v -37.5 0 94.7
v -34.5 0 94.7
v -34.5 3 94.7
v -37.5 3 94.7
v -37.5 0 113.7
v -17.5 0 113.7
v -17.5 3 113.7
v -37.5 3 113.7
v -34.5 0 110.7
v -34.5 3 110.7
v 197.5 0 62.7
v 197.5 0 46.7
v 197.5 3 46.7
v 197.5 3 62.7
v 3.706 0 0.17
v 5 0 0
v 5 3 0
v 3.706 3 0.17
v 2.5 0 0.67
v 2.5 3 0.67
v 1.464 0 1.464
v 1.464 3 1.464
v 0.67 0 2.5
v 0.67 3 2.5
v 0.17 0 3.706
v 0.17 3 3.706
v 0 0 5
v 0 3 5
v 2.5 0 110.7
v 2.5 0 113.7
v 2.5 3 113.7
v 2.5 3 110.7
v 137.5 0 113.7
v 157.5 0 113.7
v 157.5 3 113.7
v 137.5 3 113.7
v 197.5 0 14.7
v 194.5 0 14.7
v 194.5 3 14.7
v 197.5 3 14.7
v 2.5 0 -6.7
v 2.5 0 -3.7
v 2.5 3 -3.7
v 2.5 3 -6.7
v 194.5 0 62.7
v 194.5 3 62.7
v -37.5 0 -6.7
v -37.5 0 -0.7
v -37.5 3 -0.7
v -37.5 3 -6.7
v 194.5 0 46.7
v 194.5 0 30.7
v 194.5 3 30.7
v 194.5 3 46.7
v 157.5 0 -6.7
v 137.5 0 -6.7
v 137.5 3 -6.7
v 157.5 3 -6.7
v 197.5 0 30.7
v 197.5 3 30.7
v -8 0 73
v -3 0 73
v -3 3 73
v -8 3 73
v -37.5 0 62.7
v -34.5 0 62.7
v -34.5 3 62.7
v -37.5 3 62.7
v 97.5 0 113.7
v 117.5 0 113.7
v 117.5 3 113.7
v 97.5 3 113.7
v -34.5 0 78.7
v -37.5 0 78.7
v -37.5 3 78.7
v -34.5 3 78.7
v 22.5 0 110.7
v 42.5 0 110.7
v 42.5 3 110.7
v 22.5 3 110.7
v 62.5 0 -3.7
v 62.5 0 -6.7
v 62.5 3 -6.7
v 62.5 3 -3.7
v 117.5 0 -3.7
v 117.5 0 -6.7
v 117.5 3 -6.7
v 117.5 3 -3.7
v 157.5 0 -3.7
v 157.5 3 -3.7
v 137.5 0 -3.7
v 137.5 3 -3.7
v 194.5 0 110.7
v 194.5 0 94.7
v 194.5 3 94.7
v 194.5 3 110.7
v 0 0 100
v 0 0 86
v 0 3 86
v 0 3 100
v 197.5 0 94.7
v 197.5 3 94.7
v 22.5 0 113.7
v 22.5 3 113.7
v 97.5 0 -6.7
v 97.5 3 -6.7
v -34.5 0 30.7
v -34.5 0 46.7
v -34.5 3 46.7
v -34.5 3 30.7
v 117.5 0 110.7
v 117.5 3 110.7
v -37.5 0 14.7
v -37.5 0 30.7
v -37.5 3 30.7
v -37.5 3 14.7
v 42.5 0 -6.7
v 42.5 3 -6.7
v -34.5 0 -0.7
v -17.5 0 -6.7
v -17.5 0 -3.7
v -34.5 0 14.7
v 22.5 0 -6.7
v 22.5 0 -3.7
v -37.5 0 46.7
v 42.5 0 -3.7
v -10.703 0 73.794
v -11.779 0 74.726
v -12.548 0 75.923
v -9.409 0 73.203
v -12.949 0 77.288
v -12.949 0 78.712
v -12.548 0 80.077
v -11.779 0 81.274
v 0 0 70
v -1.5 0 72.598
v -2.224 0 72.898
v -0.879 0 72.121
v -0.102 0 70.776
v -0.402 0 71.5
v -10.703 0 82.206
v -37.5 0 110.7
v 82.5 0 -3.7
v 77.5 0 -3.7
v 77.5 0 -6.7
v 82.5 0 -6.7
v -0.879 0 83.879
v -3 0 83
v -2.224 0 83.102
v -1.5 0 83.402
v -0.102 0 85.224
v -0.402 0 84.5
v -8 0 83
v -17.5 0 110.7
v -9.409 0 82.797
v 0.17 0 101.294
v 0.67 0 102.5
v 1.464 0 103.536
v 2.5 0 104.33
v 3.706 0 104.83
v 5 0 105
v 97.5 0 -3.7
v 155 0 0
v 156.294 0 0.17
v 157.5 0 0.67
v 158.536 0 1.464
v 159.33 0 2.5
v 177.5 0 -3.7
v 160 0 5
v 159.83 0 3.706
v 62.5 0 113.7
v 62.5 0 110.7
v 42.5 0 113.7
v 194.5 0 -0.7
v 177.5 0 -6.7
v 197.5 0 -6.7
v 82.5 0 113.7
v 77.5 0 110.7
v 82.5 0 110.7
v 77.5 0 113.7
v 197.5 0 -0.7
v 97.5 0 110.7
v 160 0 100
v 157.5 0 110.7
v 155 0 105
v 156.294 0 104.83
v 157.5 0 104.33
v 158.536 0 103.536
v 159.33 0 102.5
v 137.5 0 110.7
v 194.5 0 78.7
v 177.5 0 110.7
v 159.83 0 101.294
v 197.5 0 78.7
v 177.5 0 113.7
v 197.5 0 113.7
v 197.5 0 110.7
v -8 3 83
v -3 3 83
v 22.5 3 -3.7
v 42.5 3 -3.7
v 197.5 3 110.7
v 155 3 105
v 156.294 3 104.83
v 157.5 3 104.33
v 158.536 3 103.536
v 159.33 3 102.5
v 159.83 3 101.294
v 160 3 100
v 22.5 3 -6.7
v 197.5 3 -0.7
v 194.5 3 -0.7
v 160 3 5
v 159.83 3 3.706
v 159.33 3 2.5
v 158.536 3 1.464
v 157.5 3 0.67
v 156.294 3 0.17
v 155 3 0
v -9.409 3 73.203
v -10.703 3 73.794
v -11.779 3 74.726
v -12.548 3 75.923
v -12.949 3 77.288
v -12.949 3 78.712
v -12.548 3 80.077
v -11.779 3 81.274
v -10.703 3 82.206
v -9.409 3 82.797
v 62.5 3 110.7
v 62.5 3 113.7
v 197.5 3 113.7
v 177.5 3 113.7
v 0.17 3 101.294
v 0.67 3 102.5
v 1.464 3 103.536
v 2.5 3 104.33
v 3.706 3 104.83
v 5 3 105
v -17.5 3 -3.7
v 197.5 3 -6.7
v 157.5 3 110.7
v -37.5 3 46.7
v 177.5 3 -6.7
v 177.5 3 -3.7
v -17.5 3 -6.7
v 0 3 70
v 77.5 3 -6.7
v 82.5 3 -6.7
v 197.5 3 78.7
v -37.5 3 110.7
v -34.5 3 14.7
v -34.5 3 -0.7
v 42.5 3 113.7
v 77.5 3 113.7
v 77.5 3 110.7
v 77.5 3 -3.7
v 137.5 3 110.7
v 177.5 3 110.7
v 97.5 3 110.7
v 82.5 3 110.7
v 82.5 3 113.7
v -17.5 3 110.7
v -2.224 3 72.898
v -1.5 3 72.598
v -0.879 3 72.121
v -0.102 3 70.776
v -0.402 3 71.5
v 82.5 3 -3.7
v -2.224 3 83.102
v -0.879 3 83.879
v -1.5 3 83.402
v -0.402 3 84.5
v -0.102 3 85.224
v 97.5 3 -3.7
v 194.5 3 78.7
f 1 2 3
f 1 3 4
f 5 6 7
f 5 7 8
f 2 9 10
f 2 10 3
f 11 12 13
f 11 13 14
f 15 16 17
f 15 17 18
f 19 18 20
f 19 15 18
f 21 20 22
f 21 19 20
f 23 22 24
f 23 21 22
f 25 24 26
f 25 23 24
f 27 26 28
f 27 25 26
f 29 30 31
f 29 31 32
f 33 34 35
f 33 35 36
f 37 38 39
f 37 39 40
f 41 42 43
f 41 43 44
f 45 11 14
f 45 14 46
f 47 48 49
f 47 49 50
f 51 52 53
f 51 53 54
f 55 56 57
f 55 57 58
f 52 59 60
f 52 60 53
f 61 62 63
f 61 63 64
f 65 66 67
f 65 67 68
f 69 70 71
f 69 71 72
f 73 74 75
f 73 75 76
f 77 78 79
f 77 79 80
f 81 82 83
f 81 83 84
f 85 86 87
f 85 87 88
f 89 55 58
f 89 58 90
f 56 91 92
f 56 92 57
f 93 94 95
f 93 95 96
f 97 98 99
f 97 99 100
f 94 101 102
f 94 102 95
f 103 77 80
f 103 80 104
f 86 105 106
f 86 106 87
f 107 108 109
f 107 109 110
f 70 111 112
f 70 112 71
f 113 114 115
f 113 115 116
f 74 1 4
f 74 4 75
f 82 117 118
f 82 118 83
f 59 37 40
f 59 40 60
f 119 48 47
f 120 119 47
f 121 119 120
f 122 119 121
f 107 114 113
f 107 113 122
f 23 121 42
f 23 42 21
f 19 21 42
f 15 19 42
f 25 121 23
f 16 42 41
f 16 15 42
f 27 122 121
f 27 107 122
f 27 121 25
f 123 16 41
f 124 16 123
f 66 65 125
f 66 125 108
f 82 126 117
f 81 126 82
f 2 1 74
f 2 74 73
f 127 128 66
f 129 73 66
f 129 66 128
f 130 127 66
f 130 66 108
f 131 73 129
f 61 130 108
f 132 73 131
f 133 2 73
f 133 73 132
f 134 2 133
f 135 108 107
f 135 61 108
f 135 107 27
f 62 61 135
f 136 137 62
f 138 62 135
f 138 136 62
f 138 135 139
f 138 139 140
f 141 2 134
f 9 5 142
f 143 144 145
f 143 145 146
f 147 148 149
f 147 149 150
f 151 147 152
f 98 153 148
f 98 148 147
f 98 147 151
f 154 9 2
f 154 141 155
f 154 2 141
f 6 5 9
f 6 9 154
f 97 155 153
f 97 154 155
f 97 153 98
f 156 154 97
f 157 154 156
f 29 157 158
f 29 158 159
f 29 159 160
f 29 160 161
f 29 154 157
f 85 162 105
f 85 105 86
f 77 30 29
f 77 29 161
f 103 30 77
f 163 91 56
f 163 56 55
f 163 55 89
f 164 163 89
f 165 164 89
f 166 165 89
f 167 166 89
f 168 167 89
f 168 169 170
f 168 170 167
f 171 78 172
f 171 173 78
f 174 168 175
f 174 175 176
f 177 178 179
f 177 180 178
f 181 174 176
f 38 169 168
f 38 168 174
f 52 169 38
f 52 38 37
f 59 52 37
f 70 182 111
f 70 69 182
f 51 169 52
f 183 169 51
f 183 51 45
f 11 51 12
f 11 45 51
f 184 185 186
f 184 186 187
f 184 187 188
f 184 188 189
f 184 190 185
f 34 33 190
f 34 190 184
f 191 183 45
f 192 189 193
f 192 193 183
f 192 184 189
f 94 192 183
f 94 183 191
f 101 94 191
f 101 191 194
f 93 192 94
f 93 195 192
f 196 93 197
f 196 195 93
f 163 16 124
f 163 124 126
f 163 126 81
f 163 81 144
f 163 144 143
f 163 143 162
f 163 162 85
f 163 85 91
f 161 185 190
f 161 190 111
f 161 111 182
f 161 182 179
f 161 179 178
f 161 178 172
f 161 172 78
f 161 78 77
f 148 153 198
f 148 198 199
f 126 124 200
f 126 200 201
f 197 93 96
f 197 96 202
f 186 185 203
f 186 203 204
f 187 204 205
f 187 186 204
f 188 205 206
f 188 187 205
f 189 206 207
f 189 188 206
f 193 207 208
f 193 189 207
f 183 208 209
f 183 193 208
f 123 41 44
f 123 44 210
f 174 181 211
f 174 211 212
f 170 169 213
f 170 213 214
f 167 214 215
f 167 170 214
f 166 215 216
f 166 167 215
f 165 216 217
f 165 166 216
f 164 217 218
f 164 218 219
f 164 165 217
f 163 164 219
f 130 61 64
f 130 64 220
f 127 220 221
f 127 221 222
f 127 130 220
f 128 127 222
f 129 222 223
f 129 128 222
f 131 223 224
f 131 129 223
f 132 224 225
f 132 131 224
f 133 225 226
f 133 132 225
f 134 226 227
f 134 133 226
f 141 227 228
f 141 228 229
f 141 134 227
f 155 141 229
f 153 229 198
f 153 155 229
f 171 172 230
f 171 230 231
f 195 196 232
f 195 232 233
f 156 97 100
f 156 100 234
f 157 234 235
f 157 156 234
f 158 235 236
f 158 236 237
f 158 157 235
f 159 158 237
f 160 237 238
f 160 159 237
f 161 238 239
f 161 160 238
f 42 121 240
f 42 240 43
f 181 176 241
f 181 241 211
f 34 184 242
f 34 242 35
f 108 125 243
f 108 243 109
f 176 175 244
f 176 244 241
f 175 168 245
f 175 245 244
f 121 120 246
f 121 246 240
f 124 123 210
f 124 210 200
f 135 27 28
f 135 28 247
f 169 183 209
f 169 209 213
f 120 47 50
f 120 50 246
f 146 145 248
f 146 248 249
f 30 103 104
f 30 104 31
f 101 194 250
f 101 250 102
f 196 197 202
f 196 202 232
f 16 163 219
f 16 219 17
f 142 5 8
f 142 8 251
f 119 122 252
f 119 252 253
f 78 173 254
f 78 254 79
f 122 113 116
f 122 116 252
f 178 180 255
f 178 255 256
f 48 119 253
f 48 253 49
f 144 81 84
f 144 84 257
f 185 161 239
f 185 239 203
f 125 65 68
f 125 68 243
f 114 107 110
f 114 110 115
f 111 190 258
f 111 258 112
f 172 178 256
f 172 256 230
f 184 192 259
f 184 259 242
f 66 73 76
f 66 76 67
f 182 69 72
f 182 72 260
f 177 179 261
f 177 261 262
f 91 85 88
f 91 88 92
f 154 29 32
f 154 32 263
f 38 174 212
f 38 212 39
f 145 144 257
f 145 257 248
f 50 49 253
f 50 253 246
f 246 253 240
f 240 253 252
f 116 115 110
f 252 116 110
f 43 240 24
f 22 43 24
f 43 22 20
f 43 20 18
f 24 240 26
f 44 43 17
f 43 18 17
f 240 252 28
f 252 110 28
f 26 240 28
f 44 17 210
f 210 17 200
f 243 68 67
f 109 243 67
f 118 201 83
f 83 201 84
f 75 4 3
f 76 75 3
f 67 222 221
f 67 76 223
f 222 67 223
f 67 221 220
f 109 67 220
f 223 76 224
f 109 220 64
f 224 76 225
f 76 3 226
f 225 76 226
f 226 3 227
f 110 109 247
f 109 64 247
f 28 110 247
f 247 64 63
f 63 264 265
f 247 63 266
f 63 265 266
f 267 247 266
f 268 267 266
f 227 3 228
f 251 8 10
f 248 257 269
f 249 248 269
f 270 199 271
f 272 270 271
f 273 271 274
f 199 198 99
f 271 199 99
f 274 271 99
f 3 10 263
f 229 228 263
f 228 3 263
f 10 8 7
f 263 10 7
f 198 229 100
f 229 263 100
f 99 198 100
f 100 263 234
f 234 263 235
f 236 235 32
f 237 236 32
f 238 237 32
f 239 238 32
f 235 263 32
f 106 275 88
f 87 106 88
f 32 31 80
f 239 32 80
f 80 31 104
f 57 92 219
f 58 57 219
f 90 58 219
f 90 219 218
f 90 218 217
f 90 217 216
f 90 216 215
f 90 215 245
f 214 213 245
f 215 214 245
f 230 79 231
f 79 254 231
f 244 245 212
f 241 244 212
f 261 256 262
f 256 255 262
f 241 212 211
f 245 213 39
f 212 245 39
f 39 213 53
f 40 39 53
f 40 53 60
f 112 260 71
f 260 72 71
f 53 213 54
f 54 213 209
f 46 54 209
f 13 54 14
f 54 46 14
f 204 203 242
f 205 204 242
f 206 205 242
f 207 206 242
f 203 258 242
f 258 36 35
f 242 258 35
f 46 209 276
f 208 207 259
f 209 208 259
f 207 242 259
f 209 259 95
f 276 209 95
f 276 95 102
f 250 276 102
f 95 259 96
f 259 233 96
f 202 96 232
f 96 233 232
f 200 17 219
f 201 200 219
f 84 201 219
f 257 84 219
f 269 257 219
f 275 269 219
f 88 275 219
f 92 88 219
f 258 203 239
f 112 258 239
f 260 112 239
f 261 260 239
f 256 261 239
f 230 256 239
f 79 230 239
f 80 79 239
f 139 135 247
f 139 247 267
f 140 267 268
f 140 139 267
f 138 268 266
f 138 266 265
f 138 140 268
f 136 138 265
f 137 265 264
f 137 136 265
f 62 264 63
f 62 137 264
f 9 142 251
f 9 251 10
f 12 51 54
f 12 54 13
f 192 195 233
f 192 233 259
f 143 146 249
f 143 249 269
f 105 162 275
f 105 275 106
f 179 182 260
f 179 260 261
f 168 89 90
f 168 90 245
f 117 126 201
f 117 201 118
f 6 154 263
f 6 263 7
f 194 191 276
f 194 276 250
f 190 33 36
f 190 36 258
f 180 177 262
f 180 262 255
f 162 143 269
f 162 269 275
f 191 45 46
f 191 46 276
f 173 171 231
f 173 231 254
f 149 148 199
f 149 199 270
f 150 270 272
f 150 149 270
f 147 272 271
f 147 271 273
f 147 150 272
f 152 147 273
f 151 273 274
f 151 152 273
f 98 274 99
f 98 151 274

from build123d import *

# Parameters (mm, degrees)
F1_DEPTH = 3


with BuildPart() as f1:
    # F0 (on Front) → F1 (new body)
    with BuildSketch(Plane.XZ):
        Polygon((-17.5, 110.7), (-17.5, 113.7), (-37.5, 113.7), (-37.5, 110.7), (-34.5, 110.7), (-34.5, 94.7), (-37.5, 94.7), (-37.5, 78.7), (-34.5, 78.7), (-34.5, 62.7), (-37.5, 62.7), (-37.5, 46.7), (-34.5, 46.7), (-34.5, 30.7), (-37.5, 30.7), (-37.5, 14.7), (-34.5, 14.7), (-34.5, -0.7), (-37.5, -0.7), (-37.5, -6.7), (-17.5, -6.7), (-17.5, -3.7), (2.5, -3.7), (2.5, -6.7), (22.5, -6.7), (22.5, -3.7), (42.5, -3.7), (42.5, -6.7), (62.5, -6.7), (62.5, -3.7), (77.5, -3.7), (77.5, -6.7), (82.5, -6.7), (82.5, -3.7), (97.5, -3.7), (97.5, -6.7), (117.5, -6.7), (117.5, -3.7), (137.5, -3.7), (137.5, -6.7), (157.5, -6.7), (157.5, -3.7), (177.5, -3.7), (177.5, -6.7), (197.5, -6.7), (197.5, -0.7), (194.5, -0.7), (194.5, 14.7), (197.5, 14.7), (197.5, 30.7), (194.5, 30.7), (194.5, 46.7), (197.5, 46.7), (197.5, 62.7), (194.5, 62.7), (194.5, 78.7), (197.5, 78.7), (197.5, 94.7), (194.5, 94.7), (194.5, 110.7), (197.5, 110.7), (197.5, 113.7), (177.5, 113.7), (177.5, 110.7), (157.5, 110.7), (157.5, 113.7), (137.5, 113.7), (137.5, 110.7), (117.5, 110.7), (117.5, 113.7), (97.5, 113.7), (97.5, 110.7), (82.5, 110.7), (82.5, 113.7), (77.5, 113.7), (77.5, 110.7), (62.5, 110.7), (62.5, 113.7), (42.5, 113.7), (42.5, 110.7), (22.5, 110.7), (22.5, 113.7), (2.5, 113.7), (2.5, 110.7), align=None)
        with BuildLine():
            Line((155, 0), (5, 0))
            ThreePointArc((5, 0), (1.464466, 1.464466), (0, 5))
            Line((0, 5), (0, 70))
            ThreePointArc((0, 70), (-0.87868, 72.12132), (-3, 73))
            Line((-3, 73), (-8, 73))
            ThreePointArc((-8, 73), (-13, 78), (-8, 83))
            Line((-8, 83), (-3, 83))
            ThreePointArc((-3, 83), (-0.87868, 83.87868), (0, 86))
            Line((0, 86), (0, 100))
            ThreePointArc((0, 100), (1.464466, 103.535534), (5, 105))
            Line((5, 105), (155, 105))
            ThreePointArc((155, 105), (158.535534, 103.535534), (160, 100))
            Line((160, 100), (160, 5))
            ThreePointArc((160, 5), (158.535534, 1.464466), (155, 0))
        make_face(mode=Mode.SUBTRACT)
    extrude(amount=-F1_DEPTH)


solid = f1.part
